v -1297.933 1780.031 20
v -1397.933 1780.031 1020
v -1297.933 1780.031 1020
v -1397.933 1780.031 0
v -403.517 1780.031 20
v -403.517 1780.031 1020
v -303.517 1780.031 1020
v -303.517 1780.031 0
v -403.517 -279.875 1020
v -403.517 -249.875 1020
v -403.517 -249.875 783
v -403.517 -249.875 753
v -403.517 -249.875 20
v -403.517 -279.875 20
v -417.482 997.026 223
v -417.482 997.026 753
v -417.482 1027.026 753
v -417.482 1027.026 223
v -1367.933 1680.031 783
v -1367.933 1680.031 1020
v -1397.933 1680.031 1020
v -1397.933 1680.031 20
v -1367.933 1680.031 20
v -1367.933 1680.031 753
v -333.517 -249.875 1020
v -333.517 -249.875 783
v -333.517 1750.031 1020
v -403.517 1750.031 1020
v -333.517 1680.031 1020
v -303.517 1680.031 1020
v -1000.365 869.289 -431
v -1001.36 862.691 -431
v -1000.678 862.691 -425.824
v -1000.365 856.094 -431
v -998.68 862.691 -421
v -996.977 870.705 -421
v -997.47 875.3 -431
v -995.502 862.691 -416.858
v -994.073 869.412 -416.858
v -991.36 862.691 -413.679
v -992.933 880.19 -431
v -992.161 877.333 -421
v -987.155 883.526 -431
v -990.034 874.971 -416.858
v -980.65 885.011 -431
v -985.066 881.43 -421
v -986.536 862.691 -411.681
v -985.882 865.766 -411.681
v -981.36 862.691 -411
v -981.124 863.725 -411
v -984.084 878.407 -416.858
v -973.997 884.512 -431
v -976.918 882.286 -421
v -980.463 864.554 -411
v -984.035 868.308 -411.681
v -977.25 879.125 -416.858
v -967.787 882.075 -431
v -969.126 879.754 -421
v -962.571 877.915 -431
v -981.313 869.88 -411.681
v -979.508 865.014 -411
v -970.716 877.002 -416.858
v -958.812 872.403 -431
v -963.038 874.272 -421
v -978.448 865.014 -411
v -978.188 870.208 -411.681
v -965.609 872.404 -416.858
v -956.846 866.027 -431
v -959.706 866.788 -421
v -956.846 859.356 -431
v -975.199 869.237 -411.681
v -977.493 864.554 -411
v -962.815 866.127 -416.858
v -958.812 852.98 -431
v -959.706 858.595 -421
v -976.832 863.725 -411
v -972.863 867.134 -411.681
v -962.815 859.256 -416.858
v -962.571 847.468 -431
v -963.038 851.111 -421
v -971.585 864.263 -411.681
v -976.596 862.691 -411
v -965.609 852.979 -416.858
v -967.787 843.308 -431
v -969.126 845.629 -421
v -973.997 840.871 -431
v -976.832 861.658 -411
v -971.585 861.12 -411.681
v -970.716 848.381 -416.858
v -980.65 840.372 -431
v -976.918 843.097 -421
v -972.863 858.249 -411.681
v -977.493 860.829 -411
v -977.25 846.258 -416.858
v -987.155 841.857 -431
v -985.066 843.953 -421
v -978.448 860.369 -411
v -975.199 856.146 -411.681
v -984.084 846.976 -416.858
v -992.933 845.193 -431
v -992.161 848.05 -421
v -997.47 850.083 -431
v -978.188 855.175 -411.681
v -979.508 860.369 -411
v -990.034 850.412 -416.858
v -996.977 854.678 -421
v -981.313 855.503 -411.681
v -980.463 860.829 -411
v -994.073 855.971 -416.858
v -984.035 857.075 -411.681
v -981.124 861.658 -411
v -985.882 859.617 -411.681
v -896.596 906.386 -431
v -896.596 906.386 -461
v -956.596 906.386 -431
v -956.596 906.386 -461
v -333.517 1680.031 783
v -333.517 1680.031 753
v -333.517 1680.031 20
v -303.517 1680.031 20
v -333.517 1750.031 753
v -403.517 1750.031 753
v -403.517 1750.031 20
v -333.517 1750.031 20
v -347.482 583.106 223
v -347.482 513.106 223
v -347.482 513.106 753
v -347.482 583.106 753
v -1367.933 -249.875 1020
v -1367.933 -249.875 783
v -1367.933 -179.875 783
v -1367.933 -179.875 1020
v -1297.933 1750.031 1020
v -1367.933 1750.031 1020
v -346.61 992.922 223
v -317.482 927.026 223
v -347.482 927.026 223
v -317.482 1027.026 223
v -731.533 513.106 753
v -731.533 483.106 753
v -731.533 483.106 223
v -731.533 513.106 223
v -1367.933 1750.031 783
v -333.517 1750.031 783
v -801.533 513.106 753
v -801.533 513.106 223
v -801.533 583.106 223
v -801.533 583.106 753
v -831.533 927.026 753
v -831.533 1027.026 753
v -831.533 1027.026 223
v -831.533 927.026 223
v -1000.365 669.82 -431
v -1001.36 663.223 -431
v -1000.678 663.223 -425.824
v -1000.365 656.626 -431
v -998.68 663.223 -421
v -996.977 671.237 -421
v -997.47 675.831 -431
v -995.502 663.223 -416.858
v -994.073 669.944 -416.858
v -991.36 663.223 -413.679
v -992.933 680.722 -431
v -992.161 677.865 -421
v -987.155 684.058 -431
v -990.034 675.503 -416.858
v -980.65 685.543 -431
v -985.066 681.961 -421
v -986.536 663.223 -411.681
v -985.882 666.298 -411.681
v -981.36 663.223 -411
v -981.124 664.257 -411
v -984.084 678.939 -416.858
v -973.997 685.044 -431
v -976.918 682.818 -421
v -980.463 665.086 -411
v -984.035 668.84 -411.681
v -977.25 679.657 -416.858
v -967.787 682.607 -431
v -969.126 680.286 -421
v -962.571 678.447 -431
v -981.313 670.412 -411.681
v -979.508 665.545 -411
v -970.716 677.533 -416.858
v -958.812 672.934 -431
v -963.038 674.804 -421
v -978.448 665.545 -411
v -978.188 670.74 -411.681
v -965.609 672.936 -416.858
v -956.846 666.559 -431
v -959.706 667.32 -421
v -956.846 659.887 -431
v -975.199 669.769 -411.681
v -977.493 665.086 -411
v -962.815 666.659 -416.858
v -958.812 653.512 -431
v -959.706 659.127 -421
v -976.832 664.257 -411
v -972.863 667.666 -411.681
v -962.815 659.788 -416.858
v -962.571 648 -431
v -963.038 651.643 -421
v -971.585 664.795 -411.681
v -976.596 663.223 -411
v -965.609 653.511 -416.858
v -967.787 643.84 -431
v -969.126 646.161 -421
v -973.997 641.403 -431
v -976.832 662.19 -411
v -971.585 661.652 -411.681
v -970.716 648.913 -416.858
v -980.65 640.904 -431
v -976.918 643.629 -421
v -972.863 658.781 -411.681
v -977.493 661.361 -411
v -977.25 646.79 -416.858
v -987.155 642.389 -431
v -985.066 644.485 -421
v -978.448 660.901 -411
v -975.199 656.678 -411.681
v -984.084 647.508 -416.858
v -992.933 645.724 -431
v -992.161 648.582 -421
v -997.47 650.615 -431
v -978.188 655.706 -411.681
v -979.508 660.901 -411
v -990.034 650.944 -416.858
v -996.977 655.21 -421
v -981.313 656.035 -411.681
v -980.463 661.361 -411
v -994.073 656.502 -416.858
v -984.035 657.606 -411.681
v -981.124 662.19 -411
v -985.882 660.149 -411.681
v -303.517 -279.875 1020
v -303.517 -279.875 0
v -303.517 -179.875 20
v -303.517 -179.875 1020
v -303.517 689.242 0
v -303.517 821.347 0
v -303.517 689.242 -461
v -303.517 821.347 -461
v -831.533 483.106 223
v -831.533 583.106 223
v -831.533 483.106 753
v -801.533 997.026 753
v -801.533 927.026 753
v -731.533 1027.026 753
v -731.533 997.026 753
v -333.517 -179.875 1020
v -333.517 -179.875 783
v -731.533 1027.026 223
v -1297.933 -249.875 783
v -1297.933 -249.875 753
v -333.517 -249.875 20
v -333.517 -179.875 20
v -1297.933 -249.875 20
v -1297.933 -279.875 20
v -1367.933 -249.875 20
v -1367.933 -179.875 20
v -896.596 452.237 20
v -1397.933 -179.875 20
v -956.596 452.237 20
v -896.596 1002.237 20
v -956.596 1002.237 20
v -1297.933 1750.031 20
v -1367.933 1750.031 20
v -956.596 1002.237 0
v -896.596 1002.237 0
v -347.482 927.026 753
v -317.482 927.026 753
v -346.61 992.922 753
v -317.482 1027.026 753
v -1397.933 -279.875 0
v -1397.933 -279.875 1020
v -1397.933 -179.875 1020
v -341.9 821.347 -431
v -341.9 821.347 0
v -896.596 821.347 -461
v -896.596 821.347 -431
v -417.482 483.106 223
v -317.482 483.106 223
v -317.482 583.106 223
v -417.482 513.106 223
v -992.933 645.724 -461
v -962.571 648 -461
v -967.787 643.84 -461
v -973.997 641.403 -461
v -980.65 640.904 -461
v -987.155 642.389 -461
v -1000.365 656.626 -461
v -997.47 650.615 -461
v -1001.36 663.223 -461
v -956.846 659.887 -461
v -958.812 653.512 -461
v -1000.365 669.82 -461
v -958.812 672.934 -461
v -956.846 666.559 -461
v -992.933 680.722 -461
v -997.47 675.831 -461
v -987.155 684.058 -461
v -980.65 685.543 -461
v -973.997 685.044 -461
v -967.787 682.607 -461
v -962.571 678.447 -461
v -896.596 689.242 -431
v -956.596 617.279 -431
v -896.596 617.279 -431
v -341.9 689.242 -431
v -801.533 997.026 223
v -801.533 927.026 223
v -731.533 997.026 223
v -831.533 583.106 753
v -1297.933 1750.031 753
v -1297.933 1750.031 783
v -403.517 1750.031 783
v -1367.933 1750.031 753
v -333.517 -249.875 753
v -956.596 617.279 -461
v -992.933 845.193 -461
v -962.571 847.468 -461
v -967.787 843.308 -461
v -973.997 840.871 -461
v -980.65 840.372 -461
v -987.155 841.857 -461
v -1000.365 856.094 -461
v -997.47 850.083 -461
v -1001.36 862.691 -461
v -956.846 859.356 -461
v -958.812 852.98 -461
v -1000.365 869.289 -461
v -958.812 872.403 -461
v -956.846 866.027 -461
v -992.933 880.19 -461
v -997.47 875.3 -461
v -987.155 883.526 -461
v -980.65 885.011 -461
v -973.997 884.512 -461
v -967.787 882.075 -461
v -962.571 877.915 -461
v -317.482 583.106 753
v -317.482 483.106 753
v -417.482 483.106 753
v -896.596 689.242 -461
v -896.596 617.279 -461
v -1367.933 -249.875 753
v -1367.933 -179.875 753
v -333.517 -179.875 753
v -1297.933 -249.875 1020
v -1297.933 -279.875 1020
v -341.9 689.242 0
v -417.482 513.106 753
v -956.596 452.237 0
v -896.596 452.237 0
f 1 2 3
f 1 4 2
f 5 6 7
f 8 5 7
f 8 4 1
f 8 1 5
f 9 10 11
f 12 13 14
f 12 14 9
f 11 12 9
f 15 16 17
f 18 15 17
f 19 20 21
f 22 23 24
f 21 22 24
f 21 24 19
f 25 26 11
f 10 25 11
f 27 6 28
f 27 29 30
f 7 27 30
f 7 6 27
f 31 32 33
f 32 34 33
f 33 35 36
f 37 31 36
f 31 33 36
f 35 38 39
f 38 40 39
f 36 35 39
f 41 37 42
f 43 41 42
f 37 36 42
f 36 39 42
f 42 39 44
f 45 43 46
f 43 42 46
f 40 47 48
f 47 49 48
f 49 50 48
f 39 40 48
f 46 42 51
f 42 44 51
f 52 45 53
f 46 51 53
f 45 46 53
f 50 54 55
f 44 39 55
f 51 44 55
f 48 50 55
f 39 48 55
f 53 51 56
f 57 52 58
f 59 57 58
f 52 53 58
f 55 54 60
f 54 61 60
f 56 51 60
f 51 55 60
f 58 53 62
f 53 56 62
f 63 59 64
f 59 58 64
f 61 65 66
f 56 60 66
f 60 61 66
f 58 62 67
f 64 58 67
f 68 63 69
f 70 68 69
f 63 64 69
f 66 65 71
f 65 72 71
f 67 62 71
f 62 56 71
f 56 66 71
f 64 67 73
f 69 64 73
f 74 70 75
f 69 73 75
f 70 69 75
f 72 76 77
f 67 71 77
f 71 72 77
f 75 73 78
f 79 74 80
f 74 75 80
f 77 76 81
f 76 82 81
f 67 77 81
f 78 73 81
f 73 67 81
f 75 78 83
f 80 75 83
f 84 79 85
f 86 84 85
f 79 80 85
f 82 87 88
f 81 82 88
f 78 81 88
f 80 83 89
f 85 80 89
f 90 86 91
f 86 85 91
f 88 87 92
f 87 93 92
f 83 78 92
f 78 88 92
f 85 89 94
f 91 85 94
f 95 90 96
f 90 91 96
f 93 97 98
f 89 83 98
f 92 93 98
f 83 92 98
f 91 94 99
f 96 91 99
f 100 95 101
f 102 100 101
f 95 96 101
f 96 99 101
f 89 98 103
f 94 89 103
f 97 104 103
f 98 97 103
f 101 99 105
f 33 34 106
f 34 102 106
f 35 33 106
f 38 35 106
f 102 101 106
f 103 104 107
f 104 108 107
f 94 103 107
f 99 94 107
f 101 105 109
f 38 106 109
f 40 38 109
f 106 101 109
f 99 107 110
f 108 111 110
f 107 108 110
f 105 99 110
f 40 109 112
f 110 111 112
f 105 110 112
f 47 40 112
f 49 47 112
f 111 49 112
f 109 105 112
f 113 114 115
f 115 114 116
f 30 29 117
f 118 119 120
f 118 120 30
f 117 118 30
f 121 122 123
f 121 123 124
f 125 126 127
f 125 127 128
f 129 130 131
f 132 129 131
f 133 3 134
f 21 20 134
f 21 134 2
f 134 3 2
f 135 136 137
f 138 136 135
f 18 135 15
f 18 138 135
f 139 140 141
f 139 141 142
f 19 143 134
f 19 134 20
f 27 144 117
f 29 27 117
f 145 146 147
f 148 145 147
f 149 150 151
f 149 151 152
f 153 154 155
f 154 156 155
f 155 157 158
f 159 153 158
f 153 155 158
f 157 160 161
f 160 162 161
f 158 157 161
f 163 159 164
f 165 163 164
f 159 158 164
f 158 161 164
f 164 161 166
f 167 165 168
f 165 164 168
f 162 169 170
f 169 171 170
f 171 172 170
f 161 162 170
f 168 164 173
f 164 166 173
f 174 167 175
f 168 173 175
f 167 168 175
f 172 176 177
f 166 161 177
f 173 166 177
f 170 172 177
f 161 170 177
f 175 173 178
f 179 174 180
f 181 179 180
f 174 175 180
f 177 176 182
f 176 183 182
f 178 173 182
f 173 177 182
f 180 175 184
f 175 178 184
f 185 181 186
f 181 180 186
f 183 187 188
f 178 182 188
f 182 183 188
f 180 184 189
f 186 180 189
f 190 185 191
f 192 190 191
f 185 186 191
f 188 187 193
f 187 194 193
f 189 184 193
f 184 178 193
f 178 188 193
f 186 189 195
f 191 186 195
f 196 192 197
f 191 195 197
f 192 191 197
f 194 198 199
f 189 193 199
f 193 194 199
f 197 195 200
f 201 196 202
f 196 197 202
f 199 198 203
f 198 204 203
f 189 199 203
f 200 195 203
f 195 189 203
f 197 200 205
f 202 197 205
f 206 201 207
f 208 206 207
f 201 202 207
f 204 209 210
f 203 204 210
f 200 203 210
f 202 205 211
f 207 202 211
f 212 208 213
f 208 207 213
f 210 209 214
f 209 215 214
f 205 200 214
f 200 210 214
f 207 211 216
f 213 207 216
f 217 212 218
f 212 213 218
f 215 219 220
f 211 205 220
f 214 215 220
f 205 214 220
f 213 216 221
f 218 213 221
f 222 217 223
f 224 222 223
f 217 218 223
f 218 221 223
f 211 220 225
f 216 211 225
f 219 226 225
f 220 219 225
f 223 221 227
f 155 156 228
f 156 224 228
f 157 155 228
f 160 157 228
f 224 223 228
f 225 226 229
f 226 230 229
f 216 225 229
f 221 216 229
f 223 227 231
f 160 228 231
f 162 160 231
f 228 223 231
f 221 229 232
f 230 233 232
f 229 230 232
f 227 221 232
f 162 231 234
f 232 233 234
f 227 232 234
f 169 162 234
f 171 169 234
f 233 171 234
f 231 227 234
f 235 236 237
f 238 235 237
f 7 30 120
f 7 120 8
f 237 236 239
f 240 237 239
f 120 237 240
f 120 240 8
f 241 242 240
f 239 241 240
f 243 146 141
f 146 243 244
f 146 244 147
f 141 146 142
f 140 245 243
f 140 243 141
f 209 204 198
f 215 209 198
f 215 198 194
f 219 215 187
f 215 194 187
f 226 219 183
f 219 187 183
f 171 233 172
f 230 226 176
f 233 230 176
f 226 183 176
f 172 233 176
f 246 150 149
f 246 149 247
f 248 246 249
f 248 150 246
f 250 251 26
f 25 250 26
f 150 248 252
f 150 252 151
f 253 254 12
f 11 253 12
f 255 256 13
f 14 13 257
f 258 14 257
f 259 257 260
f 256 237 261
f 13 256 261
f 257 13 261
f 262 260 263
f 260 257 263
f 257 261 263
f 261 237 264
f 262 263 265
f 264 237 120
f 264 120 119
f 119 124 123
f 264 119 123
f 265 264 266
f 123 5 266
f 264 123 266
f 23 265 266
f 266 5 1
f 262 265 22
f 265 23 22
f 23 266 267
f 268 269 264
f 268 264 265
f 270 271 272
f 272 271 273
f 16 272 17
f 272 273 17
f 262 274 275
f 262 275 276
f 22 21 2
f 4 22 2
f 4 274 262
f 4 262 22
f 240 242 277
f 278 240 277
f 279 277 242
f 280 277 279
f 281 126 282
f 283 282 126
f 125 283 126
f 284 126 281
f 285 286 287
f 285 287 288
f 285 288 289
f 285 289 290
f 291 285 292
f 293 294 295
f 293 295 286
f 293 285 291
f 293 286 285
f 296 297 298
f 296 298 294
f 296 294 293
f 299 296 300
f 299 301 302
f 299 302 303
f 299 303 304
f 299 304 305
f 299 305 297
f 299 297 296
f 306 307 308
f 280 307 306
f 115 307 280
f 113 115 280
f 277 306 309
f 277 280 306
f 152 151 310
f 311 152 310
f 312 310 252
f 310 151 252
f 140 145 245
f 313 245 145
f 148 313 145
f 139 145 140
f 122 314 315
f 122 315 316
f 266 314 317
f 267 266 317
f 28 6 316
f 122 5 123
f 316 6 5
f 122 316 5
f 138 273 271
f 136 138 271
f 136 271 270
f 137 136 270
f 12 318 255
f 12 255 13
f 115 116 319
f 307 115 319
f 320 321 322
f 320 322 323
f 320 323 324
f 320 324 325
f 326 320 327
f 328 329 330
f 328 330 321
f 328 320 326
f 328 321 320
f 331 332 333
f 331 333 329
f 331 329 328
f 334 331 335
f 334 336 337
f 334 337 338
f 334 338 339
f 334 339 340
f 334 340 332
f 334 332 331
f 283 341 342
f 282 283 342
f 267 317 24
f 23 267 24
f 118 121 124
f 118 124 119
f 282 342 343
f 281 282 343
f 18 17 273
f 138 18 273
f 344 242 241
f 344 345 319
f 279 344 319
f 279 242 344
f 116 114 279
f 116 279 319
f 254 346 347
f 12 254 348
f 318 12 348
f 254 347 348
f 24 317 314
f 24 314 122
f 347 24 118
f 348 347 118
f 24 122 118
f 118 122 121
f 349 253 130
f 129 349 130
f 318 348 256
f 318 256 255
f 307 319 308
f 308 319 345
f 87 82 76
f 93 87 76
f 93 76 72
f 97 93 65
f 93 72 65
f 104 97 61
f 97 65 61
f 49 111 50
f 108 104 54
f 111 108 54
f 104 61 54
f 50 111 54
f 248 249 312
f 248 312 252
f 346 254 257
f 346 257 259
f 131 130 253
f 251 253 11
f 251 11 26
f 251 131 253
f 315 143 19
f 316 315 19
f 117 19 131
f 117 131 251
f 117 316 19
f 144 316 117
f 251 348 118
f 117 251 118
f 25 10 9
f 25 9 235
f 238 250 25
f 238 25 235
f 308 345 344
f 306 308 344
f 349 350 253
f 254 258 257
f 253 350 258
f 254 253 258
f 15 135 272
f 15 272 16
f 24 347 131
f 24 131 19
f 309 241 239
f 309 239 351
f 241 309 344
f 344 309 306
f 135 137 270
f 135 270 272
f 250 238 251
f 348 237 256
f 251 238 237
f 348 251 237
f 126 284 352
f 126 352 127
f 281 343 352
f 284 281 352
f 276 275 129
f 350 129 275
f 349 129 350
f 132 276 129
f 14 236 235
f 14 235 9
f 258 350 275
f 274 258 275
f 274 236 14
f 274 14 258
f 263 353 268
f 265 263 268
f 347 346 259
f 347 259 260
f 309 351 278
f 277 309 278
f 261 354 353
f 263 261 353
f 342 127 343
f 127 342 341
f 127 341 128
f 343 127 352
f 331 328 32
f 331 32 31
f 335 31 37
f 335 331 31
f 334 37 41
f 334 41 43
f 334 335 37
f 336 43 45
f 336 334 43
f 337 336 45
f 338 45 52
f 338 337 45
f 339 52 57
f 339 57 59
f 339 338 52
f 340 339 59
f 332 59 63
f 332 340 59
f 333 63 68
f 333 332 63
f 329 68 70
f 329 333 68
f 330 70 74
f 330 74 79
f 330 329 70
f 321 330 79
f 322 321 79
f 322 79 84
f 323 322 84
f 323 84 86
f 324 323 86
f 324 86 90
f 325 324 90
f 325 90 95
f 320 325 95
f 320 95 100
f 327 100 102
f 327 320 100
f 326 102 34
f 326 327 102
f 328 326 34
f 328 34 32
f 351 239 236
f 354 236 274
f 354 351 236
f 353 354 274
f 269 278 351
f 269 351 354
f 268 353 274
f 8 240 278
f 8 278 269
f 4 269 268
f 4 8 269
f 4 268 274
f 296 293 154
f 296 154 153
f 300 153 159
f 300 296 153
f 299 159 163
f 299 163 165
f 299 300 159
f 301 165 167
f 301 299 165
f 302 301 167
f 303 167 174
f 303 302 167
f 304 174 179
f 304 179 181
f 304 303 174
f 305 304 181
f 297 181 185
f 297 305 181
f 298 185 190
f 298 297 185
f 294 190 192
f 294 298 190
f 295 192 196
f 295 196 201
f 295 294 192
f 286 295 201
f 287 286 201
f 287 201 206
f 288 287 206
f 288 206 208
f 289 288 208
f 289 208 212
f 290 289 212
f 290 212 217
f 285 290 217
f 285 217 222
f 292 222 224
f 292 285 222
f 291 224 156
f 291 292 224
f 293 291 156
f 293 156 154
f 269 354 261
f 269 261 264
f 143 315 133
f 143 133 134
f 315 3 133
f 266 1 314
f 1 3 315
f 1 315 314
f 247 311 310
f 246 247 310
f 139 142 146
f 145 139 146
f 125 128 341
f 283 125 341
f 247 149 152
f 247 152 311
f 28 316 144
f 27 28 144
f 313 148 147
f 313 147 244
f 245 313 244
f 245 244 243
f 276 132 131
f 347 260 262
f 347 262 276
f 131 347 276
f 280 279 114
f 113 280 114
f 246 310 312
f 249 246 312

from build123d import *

# Parameters (mm, degrees)
SKETCH1_W             = 1500
SKETCH1_H             = 1500
BOSS_EXTRUDE1_DEPTH   = 20
SKETCH2_W             = 60
SKETCH2_H             = 550
CUT_EXTRUDE1_DEPTH    = 50
CUT_EXTRUDE2_DEPTH    = 2000.909849413
SKETCH4_W             = 1094.415961308
SKETCH4_H             = 600
BOSS_EXTRUDE2_DEPTH   = 20
BOSS_EXTRUDE3_DEPTH   = 1000
SKETCH6_W             = 1034.415961308
SKETCH6_H             = 1999.906293538
BOSS_EXTRUDE4_DEPTH   = 30
BOSS_EXTRUDE5_DEPTH   = 530
BOSS_EXTRUDE5_2_DEPTH = 530
BOSS_EXTRUDE5_3_DEPTH = 530
BOSS_EXTRUDE5_4_DEPTH = 530
SKETCH9_W             = 38.38274209
SKETCH9_H             = 132.105402432
BOSS_EXTRUDE6_DEPTH   = 461
BOSS_EXTRUDE7_DEPTH   = 30
SKETCH11_R            = 22.381871054
BOSS_EXTRUDE8_DEPTH   = 50
BOSS_EXTRUDE8_2_DEPTH = 50
FILLET1_R             = 20
FILLET2_R             = 20


with BuildPart() as part:
    # Sketch1 → Boss-Extrude1 (new body)
    with BuildSketch(Plane.XY):
        with Locations((-647.933366328, 680.042554992)):
            Rectangle(SKETCH1_W, SKETCH1_H)
    extrude(amount=BOSS_EXTRUDE1_DEPTH)

    # Sketch2 → Cut-Extrude1 (cut)
    with BuildSketch(Plane(origin=(0, 0, 0), x_dir=(-1, 0, 0), z_dir=(0, 0, -1))):
        with Locations((926.595771641, 727.237288333)):
            Rectangle(SKETCH2_W, SKETCH2_H)
    extrude(amount=-CUT_EXTRUDE1_DEPTH, mode=Mode.SUBTRACT)

    # Sketch3 → Cut-Extrude2 (cut, through all)
    with BuildSketch(Plane.XY.offset(20)):
        Polygon((-1397.933366328, 1180.031353787), (-303.51740502, 1180.031353787), (-303.51740502, 320.125060249), (-1397.933366328, 320.125060249), (-2007.945142602, 196.828102761), (-1938.57438465, -209.936796138), (-1019.34429441, -263.492739842), (191.211340308, -395.978442354), (1017.298661853, -131.007037329), (397.03562433, 795.178187448), (264.742348401, 1570.89785085), (-1070.217072335, 1498.737882161), (-1589.868105208, 1438.824408359), (-1644.490156481, 1252.191322475), align=None)
    extrude(amount=-CUT_EXTRUDE2_DEPTH, mode=Mode.SUBTRACT)

    # Sketch4 → Boss-Extrude2 (add)
    with BuildSketch(Plane(origin=(0, 0, 0), x_dir=(-1, 0, 0), z_dir=(0, 0, -1))):
        with Locations((850.725385674, 1480.031353787)):
            Rectangle(SKETCH4_W, SKETCH4_H)
        with Locations((850.725385674, 20.125060249)):
            Rectangle(SKETCH4_W, SKETCH4_H)
    extrude(amount=-BOSS_EXTRUDE2_DEPTH)

    # Sketch5 → Boss-Extrude3 (add)
    with BuildSketch(Plane.XY.offset(20)):
        Polygon((-1397.933366328, 1780.031353787), (-1297.933366328, 1780.031353787), (-1297.933366328, 1750.031353787), (-1367.933366328, 1750.031353787), (-1367.933366328, 1680.031353787), (-1397.933366328, 1680.031353787), align=None)
        Polygon((-303.51740502, 1780.031353787), (-403.51740502, 1780.031353787), (-403.51740502, 1750.031353787), (-333.51740502, 1750.031353787), (-333.51740502, 1680.031353787), (-303.51740502, 1680.031353787), align=None)
        Polygon((-1397.933366328, -179.874939751), (-1397.933366328, -279.874939751), (-1297.933366328, -279.874939751), (-1297.933366328, -249.874939751), (-1367.933366328, -249.874939751), (-1367.933366328, -179.874939751), align=None)
        Polygon((-303.51740502, -279.874939751), (-303.51740502, -179.874939751), (-333.51740502, -179.874939751), (-333.51740502, -249.874939751), (-403.51740502, -249.874939751), (-403.51740502, -279.874939751), align=None)
    extrude(amount=BOSS_EXTRUDE3_DEPTH)

    # Sketch6 → Boss-Extrude4 (add)
    with BuildSketch(Plane.XY.offset(753)):
        with Locations((-850.725385674, 750.078207018)):
            Rectangle(SKETCH6_W, SKETCH6_H)
    extrude(amount=BOSS_EXTRUDE4_DEPTH)

    # Sketch9 → Boss-Extrude6 (add)
    with BuildSketch(Plane(origin=(0, 0, 0), x_dir=(-1, 0, 0), z_dir=(0, 0, -1))):
        with Locations((322.708776065, 755.294441101)):
            Rectangle(SKETCH9_W, SKETCH9_H)
    extrude(amount=BOSS_EXTRUDE6_DEPTH)

    # Sketch10 → Boss-Extrude7 (add)
    with BuildSketch(Plane(origin=(0, 0, -461), x_dir=(-1, 0, 0), z_dir=(0, 0, -1))):
        Polygon((303.51740502, 821.347142317), (896.595771641, 821.347142317), (896.595771641, 906.386015183), (956.595771641, 906.386015183), (956.595771641, 617.278895192), (896.595771641, 617.278895192), (896.595771641, 689.241739885), (303.51740502, 689.241739885), align=None)
    extrude(amount=-BOSS_EXTRUDE7_DEPTH)


with BuildPart() as body_2:
    # Sketch8 → Boss-Extrude5 (new body)
    with BuildSketch(Plane(origin=(0, 0, 753), x_dir=(-1, 0, 0), z_dir=(0, 0, -1))):
        Polygon((346.609702996, 992.92220544), (417.482318412, 997.02649787), (417.482318412, 1027.02649787), (317.482318412, 1027.02649787), (317.482318412, 927.02649787), (347.482318412, 927.02649787), align=None)
    extrude(amount=BOSS_EXTRUDE5_DEPTH)


with BuildPart() as body_3:
    # Sketch8 → Boss-Extrude5 2 (new body)
    with BuildSketch(Plane(origin=(0, 0, 753), x_dir=(-1, 0, 0), z_dir=(0, 0, -1))):
        Polygon((731.532784981, 997.02649787), (731.532784981, 1027.02649787), (831.532784981, 1027.02649787), (831.532784981, 927.02649787), (801.532784981, 927.02649787), (801.532784981, 997.02649787), align=None)
    extrude(amount=BOSS_EXTRUDE5_2_DEPTH)


with BuildPart() as body_4:
    # Sketch8 → Boss-Extrude5 3 (new body)
    with BuildSketch(Plane(origin=(0, 0, 753), x_dir=(-1, 0, 0), z_dir=(0, 0, -1))):
        Polygon((801.532784981, 583.10572659), (831.532784981, 583.10572659), (831.532784981, 483.10572659), (731.532784981, 483.10572659), (731.532784981, 513.10572659), (801.532784981, 513.10572659), align=None)
    extrude(amount=BOSS_EXTRUDE5_3_DEPTH)


with BuildPart() as body_5:
    # Sketch8 → Boss-Extrude5 4 (new body)
    with BuildSketch(Plane(origin=(0, 0, 753), x_dir=(-1, 0, 0), z_dir=(0, 0, -1))):
        Polygon((347.482318412, 513.10572659), (347.482318412, 583.10572659), (317.482318412, 583.10572659), (317.482318412, 483.10572659), (417.482318412, 483.10572659), (417.482318412, 513.10572659), align=None)
    extrude(amount=BOSS_EXTRUDE5_4_DEPTH)


with BuildPart() as body_6:
    # Sketch11 → Boss-Extrude8 (new body)
    with BuildSketch(Plane(origin=(0, 0, -461), x_dir=(-1, 0, 0), z_dir=(0, 0, -1))):
        with Locations((978.977642694, 862.69149813)):
            Circle(SKETCH11_R)
    extrude(amount=-BOSS_EXTRUDE8_DEPTH)

    # Fillet1
    fillet1_edges = [body_6.edges().sort_by_distance(p)[0] for p in [
        (-956.595771641, 862.69149813, -411),
    ]]
    fillet(fillet1_edges, radius=FILLET1_R)


with BuildPart() as body_7:
    # Sketch11 → Boss-Extrude8 2 (new body)
    with BuildSketch(Plane(origin=(0, 0, -461), x_dir=(-1, 0, 0), z_dir=(0, 0, -1))):
        with Locations((978.977642694, 663.223285972)):
            Circle(SKETCH11_R)
    extrude(amount=-BOSS_EXTRUDE8_2_DEPTH)

    # Fillet2
    fillet2_edges = [body_7.edges().sort_by_distance(p)[0] for p in [
        (-956.595771641, 663.223285972, -411),
    ]]
    fillet(fillet2_edges, radius=FILLET2_R)


solid = Compound([part.part, body_2.part, body_3.part, body_4.part, body_5.part, body_6.part, body_7.part])
